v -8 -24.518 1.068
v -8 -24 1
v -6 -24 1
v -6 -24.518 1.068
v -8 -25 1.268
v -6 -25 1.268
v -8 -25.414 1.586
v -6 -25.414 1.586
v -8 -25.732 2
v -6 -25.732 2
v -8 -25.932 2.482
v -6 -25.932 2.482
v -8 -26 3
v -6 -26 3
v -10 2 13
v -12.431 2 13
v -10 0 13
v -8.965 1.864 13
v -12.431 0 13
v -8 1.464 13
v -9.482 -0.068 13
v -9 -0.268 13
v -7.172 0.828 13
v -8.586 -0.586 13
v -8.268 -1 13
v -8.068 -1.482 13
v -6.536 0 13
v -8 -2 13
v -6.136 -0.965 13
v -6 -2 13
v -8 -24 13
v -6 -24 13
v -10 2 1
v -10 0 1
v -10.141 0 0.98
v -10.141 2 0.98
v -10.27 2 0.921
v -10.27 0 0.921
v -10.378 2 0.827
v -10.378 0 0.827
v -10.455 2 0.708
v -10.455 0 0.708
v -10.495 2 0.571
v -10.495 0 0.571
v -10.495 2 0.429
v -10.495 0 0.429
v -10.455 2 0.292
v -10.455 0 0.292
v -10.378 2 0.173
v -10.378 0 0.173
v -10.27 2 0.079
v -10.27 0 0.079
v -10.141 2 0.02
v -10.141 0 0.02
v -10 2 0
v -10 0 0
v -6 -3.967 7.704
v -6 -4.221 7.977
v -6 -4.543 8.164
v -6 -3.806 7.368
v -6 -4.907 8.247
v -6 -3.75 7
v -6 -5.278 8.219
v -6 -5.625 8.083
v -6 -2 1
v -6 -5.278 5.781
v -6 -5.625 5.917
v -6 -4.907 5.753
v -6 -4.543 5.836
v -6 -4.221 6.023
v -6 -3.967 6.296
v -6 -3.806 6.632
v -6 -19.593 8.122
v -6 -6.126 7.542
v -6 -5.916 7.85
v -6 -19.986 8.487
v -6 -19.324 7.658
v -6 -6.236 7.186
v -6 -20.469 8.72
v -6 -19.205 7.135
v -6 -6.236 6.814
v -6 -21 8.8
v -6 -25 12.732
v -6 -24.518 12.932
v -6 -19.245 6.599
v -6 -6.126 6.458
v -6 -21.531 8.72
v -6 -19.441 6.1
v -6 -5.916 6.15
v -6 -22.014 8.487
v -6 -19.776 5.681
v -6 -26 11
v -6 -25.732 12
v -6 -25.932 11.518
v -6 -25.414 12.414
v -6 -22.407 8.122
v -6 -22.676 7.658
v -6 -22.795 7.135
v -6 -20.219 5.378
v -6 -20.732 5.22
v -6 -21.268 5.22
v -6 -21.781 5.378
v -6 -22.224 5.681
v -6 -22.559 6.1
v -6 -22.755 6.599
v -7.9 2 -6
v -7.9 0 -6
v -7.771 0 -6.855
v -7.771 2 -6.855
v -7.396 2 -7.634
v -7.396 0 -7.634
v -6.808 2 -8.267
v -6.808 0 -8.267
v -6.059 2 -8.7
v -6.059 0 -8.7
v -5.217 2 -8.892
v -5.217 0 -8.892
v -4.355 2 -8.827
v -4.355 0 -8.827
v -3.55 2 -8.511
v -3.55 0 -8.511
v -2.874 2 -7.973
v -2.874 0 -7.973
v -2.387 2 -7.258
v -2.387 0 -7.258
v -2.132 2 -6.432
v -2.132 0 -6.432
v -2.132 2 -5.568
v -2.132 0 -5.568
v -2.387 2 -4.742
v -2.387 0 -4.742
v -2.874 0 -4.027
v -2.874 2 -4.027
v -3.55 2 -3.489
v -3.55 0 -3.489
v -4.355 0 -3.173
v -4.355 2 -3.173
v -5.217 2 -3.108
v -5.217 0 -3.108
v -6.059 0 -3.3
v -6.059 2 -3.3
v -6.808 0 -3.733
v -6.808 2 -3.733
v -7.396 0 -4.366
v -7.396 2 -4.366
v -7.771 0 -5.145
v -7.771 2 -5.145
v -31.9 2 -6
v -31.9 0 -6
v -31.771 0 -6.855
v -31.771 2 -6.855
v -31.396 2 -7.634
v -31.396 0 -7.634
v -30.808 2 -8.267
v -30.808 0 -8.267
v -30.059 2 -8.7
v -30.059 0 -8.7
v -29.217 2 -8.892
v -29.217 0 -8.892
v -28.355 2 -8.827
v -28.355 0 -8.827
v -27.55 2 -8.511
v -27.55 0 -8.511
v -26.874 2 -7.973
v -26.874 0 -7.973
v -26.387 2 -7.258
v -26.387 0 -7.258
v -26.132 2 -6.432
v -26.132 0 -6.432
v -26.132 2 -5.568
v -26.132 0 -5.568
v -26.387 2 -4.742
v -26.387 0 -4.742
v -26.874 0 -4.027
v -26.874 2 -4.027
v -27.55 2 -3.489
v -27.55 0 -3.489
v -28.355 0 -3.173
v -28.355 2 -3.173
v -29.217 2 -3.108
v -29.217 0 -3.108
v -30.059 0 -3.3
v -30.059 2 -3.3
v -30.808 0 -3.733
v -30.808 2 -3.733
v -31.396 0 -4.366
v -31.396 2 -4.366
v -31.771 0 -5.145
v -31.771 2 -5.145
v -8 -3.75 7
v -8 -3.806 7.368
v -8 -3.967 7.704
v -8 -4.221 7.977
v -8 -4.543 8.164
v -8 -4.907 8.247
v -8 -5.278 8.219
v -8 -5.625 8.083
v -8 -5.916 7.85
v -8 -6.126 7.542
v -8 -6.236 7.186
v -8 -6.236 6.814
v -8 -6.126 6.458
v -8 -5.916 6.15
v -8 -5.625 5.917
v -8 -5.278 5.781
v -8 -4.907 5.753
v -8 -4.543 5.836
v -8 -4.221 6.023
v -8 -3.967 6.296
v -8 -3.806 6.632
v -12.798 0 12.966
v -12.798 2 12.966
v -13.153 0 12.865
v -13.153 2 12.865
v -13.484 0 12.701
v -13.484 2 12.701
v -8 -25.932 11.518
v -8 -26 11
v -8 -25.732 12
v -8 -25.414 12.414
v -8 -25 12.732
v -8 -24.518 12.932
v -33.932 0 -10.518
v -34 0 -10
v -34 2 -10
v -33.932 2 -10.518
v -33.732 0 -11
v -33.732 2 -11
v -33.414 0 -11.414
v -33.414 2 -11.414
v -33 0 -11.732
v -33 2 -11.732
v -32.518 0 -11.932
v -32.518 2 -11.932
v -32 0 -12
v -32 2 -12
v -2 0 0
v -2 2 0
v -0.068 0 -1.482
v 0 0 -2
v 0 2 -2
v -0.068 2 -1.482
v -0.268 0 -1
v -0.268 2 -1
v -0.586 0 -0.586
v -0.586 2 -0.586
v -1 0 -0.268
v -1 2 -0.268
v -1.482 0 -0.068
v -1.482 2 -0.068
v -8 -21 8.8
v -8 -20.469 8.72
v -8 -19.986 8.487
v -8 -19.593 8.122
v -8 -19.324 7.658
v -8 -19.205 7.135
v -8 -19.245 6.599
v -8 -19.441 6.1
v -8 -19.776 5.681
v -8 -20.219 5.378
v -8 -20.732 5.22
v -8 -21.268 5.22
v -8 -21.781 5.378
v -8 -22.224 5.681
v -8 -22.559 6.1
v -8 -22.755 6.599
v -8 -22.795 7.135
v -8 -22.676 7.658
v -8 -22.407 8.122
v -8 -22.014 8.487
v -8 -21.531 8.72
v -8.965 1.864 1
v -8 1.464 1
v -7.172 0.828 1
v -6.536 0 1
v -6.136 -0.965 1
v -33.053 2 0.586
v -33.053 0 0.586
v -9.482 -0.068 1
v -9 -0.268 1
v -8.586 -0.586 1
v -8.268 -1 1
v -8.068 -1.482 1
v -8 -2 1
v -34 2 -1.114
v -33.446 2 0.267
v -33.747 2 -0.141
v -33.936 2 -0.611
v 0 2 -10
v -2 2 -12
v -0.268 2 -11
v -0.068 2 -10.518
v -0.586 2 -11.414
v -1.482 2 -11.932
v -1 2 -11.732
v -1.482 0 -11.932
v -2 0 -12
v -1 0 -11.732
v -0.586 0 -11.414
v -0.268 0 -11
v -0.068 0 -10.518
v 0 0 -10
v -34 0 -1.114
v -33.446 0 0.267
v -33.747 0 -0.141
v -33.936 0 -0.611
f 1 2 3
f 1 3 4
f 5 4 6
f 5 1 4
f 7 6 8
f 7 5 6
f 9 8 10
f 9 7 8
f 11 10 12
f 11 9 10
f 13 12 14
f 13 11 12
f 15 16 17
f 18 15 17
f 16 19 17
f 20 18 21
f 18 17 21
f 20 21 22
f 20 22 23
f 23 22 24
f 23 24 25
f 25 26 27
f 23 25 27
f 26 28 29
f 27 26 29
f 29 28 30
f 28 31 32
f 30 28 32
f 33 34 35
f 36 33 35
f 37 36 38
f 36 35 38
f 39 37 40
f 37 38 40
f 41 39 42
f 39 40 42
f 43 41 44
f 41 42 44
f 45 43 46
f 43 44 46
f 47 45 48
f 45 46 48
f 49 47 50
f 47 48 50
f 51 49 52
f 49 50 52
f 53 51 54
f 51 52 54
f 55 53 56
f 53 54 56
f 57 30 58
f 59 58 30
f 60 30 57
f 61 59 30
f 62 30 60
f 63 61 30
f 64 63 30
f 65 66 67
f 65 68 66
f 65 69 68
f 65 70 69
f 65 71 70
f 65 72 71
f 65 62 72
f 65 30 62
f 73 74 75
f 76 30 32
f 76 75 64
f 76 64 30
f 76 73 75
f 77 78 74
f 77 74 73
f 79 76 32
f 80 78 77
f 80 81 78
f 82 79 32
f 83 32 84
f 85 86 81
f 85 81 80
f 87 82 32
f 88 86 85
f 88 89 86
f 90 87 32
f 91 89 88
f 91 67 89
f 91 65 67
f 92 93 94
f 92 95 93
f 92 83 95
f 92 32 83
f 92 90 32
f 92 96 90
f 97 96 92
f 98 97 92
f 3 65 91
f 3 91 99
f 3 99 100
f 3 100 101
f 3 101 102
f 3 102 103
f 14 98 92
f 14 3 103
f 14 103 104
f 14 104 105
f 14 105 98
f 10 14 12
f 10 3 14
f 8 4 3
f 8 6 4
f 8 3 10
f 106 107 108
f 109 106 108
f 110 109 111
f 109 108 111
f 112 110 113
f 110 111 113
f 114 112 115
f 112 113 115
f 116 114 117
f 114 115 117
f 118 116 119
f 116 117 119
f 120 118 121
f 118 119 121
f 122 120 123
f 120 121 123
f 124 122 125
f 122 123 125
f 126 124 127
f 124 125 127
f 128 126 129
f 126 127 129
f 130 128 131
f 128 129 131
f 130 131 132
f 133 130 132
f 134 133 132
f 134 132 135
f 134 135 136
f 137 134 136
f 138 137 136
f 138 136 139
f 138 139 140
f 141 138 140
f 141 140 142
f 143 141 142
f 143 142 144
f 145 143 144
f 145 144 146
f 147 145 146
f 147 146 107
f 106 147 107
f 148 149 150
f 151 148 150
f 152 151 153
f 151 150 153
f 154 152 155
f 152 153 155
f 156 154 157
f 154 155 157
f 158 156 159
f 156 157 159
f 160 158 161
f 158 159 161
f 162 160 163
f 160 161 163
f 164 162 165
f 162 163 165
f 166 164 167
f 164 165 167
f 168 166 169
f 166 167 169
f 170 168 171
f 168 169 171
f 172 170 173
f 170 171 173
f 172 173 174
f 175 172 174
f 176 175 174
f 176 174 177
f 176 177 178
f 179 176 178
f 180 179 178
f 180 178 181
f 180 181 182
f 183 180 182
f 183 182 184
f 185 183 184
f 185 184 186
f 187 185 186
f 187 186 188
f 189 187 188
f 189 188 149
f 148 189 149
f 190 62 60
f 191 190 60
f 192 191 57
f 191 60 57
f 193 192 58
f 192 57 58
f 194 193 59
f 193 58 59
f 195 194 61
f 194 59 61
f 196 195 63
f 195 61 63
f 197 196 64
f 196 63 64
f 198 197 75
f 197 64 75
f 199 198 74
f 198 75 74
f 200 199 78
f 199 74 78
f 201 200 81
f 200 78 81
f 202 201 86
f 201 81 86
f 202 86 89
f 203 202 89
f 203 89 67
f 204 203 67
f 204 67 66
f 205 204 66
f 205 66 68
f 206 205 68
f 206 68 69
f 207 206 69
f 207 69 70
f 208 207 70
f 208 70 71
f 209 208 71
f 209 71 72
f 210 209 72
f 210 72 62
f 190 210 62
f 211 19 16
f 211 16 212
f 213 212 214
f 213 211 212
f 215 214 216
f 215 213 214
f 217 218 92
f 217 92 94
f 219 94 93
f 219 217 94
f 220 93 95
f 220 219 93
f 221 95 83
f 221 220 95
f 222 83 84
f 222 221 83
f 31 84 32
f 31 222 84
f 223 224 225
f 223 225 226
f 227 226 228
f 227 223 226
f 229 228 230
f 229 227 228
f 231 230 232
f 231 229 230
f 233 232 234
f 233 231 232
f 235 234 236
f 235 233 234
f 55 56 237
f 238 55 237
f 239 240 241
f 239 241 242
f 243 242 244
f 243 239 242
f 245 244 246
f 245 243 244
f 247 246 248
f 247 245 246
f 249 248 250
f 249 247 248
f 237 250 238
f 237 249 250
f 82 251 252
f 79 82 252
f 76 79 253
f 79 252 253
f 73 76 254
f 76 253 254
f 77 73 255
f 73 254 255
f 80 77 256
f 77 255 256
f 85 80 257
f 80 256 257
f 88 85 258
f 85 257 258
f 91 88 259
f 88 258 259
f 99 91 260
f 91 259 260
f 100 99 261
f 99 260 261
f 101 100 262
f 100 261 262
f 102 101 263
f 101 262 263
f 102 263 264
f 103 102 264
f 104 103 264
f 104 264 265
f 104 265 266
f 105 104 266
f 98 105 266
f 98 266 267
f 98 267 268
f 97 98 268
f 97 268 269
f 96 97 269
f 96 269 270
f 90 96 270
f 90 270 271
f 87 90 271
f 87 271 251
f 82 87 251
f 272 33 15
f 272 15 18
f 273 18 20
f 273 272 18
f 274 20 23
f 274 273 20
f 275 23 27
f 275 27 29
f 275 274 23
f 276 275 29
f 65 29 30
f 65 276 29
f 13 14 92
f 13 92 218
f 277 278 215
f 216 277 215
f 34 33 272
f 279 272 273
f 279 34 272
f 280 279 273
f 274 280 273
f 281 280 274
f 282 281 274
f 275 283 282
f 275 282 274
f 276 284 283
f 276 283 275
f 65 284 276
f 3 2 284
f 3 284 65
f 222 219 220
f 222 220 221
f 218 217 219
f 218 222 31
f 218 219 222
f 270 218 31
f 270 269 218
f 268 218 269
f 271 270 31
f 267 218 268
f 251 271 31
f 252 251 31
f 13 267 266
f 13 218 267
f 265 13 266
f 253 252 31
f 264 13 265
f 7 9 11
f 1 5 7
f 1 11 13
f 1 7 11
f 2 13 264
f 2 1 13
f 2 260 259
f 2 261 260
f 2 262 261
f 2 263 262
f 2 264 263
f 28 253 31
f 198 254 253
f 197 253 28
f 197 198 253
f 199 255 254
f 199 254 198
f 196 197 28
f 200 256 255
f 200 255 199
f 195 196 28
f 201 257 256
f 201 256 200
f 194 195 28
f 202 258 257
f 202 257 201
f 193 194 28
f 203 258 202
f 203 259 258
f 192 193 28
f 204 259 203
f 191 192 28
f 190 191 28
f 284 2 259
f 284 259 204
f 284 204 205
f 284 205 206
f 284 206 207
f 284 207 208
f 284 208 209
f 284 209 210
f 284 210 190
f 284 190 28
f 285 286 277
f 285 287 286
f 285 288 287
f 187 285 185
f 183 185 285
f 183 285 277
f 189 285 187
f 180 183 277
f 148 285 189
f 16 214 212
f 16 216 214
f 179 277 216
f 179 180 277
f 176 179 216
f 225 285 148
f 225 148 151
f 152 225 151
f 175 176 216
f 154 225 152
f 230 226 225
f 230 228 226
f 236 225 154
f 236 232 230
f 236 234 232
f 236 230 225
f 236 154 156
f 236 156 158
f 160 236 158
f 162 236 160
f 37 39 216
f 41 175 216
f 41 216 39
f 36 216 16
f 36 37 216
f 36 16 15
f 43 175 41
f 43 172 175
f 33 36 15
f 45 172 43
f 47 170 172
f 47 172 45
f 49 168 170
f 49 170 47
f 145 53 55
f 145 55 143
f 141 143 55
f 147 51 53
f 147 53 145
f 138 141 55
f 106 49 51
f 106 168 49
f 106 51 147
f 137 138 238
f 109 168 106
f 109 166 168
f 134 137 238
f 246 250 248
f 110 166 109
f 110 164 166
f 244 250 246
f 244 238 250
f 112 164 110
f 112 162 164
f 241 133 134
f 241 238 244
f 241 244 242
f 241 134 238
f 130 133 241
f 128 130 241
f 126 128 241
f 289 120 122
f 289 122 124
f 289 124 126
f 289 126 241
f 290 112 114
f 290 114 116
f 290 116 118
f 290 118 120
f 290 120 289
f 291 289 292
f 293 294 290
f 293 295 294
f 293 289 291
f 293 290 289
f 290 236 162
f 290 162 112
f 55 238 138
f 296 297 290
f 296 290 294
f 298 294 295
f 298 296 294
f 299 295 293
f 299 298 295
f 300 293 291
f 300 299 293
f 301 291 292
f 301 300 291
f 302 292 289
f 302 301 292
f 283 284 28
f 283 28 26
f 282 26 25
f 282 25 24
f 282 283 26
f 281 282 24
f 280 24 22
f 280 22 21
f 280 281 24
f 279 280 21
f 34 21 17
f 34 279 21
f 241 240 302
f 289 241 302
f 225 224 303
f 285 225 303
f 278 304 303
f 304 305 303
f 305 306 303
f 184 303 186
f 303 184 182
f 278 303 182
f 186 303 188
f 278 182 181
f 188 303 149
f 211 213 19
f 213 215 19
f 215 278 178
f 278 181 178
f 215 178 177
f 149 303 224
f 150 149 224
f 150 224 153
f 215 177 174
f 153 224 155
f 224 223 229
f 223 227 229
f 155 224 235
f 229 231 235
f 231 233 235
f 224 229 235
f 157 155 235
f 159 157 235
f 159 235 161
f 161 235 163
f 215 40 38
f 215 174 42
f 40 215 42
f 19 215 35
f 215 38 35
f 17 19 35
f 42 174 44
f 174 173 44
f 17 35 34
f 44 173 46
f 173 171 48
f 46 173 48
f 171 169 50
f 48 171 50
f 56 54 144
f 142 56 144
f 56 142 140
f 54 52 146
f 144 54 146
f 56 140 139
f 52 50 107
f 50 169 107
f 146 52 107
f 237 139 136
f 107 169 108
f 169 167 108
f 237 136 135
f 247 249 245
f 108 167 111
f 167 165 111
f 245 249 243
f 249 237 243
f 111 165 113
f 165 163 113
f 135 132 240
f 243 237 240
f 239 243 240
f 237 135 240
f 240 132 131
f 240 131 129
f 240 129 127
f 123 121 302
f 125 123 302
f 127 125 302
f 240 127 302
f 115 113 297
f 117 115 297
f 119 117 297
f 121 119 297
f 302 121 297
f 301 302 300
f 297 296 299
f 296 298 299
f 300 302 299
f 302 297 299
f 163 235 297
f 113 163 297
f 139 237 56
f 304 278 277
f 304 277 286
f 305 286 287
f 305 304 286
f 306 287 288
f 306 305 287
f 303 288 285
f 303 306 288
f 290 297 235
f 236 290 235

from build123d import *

# Parameters (mm, degrees)
BASE_FLANGE1_DEPTH    = 2
EDGE_FLANGE1_DEPTH    = 12
M5_CLEARANCE_HOLE1_D  = 5.8
M3_CLEARANCE_HOLE1_D  = 3.6
SKETCH14_R            = 1.25
CUT_EXTRUDE1_DEPTH    = 41.360872141
BREAK_CORNER1_START   = -8
BREAK_CORNER1_DEPTH   = 2
BREAK_CORNER1_2_DEPTH = 2


# Read off the part's stored shape, not the designer's step: Break-Corner1
# Sheet-metal steps are written as plain solids
with BuildPart() as part:
    # Sketch1 → Base-Flange1 (new body)
    with BuildSketch(Plane(origin=(0, 0, 0), x_dir=(1, 0, 0), z_dir=(0, 1, 0))):
        with BuildLine():
            Line((0, 0), (0, 12))
            Line((0, 12), (-34, 12))
            Line((-34, 12), (-34, 0))
            Line((-34, 0), (-13, -13))
            Line((-13, -13), (-10, -13))
            Line((-10, -13), (-10, -1))
            ThreePointArc((-10, -1), (-10.5, -0.5), (-10, 0))
            Line((-10, 0), (0, 0))
        make_face()
    extrude(amount=BASE_FLANGE1_DEPTH)

    # Edge-Flange1 section (across the edge) → Edge-Flange1 (add)
    with BuildSketch(Plane(origin=(-8, 0, 1), x_dir=(-1, 0, 0), z_dir=(0, 0, 1))):
        with BuildLine():
            Line((-2, 2), (-2, 26))
            Line((-2, 26), (0, 26))
            Line((0, 26), (0, 2))
            ThreePointArc((0, 2), (0.585786438, 0.585786438), (2, 0))
            Line((2, 0), (2, -2))
            ThreePointArc((2, -2), (-0.828427125, -0.828427125), (-2, 2))
        make_face()
    extrude(amount=EDGE_FLANGE1_DEPTH)

    # M5 Clearance Hole1 (through all)
    with Locations(Plane(origin=(0, 2, 0), x_dir=(1, 0, 0), z_dir=(0, 1, 0))):
        with Locations((-29, 6), (-5, 6)):
            Hole(M5_CLEARANCE_HOLE1_D / 2)

    # M3 Clearance Hole1 (through all)
    with Locations(Plane(origin=(-6, 0, 0), x_dir=(0, 0, -1), z_dir=(1, 0, 0))):
        with Locations((-7, -21)):
            Hole(M3_CLEARANCE_HOLE1_D / 2)

    # Sketch14 → Cut-Extrude1 (cut, through all)
    with BuildSketch(Plane(origin=(-6, 0, 0), x_dir=(0, 0, -1), z_dir=(1, 0, 0))):
        with Locations(Location((-7, -5, 0), (0, 0, 90))):
            Circle(SKETCH14_R)
    extrude(amount=-CUT_EXTRUDE1_DEPTH, mode=Mode.SUBTRACT)

    # Break-Corner1 outline → Break-Corner1 (cut)
    with BuildSketch(Plane.YZ.offset(BREAK_CORNER1_START)):
        with BuildLine():
            Line((-26, 1), (-24, 1))
            ThreePointArc((-24, 1), (-25.414213562, 1.585786438), (-26, 3))
            Line((-26, 3), (-26, 1))
        make_face()
        with BuildLine():
            Line((-26, 13), (-26, 11))
            ThreePointArc((-26, 11), (-25.414213562, 12.414213562), (-24, 13))
            Line((-24, 13), (-26, 13))
        make_face()
    extrude(amount=BREAK_CORNER1_DEPTH, mode=Mode.SUBTRACT)

    # Break-Corner1 2 outline → Break-Corner1 2 (cut)
    with BuildSketch(Plane(origin=(0, 0, 0), x_dir=(1, 0, 0), z_dir=(0, 1, 0))):
        with BuildLine():
            Line((-13, -13), (-12.431049528, -13))
            ThreePointArc((-12.431049528, -13), (-12.978287782, -12.923676244), (-13.483758757, -12.700530293))
            Line((-13.483758757, -12.700530293), (-13, -13))
        make_face()
        with BuildLine():
            Line((0, 0), (0, 2))
            ThreePointArc((0, 2), (-0.585786438, 0.585786438), (-2, 0))
            Line((-2, 0), (0, 0))
        make_face()
        with BuildLine():
            Line((0, 12), (-2, 12))
            ThreePointArc((-2, 12), (-0.585786438, 11.414213562), (0, 10))
            Line((0, 10), (0, 12))
        make_face()
        with BuildLine():
            Line((-34, 12), (-34, 10))
            ThreePointArc((-34, 10), (-33.414213562, 11.414213562), (-32, 12))
            Line((-32, 12), (-34, 12))
        make_face()
        with BuildLine():
            Line((-34, 0), (-33.052709229, -0.586418096))
            ThreePointArc((-33.052709229, -0.586418096), (-33.747200398, 0.14082356), (-34, 1.114112197))
            Line((-34, 1.114112197), (-34, 0))
        make_face()
    extrude(amount=BREAK_CORNER1_2_DEPTH, mode=Mode.SUBTRACT)


solid = part.part
